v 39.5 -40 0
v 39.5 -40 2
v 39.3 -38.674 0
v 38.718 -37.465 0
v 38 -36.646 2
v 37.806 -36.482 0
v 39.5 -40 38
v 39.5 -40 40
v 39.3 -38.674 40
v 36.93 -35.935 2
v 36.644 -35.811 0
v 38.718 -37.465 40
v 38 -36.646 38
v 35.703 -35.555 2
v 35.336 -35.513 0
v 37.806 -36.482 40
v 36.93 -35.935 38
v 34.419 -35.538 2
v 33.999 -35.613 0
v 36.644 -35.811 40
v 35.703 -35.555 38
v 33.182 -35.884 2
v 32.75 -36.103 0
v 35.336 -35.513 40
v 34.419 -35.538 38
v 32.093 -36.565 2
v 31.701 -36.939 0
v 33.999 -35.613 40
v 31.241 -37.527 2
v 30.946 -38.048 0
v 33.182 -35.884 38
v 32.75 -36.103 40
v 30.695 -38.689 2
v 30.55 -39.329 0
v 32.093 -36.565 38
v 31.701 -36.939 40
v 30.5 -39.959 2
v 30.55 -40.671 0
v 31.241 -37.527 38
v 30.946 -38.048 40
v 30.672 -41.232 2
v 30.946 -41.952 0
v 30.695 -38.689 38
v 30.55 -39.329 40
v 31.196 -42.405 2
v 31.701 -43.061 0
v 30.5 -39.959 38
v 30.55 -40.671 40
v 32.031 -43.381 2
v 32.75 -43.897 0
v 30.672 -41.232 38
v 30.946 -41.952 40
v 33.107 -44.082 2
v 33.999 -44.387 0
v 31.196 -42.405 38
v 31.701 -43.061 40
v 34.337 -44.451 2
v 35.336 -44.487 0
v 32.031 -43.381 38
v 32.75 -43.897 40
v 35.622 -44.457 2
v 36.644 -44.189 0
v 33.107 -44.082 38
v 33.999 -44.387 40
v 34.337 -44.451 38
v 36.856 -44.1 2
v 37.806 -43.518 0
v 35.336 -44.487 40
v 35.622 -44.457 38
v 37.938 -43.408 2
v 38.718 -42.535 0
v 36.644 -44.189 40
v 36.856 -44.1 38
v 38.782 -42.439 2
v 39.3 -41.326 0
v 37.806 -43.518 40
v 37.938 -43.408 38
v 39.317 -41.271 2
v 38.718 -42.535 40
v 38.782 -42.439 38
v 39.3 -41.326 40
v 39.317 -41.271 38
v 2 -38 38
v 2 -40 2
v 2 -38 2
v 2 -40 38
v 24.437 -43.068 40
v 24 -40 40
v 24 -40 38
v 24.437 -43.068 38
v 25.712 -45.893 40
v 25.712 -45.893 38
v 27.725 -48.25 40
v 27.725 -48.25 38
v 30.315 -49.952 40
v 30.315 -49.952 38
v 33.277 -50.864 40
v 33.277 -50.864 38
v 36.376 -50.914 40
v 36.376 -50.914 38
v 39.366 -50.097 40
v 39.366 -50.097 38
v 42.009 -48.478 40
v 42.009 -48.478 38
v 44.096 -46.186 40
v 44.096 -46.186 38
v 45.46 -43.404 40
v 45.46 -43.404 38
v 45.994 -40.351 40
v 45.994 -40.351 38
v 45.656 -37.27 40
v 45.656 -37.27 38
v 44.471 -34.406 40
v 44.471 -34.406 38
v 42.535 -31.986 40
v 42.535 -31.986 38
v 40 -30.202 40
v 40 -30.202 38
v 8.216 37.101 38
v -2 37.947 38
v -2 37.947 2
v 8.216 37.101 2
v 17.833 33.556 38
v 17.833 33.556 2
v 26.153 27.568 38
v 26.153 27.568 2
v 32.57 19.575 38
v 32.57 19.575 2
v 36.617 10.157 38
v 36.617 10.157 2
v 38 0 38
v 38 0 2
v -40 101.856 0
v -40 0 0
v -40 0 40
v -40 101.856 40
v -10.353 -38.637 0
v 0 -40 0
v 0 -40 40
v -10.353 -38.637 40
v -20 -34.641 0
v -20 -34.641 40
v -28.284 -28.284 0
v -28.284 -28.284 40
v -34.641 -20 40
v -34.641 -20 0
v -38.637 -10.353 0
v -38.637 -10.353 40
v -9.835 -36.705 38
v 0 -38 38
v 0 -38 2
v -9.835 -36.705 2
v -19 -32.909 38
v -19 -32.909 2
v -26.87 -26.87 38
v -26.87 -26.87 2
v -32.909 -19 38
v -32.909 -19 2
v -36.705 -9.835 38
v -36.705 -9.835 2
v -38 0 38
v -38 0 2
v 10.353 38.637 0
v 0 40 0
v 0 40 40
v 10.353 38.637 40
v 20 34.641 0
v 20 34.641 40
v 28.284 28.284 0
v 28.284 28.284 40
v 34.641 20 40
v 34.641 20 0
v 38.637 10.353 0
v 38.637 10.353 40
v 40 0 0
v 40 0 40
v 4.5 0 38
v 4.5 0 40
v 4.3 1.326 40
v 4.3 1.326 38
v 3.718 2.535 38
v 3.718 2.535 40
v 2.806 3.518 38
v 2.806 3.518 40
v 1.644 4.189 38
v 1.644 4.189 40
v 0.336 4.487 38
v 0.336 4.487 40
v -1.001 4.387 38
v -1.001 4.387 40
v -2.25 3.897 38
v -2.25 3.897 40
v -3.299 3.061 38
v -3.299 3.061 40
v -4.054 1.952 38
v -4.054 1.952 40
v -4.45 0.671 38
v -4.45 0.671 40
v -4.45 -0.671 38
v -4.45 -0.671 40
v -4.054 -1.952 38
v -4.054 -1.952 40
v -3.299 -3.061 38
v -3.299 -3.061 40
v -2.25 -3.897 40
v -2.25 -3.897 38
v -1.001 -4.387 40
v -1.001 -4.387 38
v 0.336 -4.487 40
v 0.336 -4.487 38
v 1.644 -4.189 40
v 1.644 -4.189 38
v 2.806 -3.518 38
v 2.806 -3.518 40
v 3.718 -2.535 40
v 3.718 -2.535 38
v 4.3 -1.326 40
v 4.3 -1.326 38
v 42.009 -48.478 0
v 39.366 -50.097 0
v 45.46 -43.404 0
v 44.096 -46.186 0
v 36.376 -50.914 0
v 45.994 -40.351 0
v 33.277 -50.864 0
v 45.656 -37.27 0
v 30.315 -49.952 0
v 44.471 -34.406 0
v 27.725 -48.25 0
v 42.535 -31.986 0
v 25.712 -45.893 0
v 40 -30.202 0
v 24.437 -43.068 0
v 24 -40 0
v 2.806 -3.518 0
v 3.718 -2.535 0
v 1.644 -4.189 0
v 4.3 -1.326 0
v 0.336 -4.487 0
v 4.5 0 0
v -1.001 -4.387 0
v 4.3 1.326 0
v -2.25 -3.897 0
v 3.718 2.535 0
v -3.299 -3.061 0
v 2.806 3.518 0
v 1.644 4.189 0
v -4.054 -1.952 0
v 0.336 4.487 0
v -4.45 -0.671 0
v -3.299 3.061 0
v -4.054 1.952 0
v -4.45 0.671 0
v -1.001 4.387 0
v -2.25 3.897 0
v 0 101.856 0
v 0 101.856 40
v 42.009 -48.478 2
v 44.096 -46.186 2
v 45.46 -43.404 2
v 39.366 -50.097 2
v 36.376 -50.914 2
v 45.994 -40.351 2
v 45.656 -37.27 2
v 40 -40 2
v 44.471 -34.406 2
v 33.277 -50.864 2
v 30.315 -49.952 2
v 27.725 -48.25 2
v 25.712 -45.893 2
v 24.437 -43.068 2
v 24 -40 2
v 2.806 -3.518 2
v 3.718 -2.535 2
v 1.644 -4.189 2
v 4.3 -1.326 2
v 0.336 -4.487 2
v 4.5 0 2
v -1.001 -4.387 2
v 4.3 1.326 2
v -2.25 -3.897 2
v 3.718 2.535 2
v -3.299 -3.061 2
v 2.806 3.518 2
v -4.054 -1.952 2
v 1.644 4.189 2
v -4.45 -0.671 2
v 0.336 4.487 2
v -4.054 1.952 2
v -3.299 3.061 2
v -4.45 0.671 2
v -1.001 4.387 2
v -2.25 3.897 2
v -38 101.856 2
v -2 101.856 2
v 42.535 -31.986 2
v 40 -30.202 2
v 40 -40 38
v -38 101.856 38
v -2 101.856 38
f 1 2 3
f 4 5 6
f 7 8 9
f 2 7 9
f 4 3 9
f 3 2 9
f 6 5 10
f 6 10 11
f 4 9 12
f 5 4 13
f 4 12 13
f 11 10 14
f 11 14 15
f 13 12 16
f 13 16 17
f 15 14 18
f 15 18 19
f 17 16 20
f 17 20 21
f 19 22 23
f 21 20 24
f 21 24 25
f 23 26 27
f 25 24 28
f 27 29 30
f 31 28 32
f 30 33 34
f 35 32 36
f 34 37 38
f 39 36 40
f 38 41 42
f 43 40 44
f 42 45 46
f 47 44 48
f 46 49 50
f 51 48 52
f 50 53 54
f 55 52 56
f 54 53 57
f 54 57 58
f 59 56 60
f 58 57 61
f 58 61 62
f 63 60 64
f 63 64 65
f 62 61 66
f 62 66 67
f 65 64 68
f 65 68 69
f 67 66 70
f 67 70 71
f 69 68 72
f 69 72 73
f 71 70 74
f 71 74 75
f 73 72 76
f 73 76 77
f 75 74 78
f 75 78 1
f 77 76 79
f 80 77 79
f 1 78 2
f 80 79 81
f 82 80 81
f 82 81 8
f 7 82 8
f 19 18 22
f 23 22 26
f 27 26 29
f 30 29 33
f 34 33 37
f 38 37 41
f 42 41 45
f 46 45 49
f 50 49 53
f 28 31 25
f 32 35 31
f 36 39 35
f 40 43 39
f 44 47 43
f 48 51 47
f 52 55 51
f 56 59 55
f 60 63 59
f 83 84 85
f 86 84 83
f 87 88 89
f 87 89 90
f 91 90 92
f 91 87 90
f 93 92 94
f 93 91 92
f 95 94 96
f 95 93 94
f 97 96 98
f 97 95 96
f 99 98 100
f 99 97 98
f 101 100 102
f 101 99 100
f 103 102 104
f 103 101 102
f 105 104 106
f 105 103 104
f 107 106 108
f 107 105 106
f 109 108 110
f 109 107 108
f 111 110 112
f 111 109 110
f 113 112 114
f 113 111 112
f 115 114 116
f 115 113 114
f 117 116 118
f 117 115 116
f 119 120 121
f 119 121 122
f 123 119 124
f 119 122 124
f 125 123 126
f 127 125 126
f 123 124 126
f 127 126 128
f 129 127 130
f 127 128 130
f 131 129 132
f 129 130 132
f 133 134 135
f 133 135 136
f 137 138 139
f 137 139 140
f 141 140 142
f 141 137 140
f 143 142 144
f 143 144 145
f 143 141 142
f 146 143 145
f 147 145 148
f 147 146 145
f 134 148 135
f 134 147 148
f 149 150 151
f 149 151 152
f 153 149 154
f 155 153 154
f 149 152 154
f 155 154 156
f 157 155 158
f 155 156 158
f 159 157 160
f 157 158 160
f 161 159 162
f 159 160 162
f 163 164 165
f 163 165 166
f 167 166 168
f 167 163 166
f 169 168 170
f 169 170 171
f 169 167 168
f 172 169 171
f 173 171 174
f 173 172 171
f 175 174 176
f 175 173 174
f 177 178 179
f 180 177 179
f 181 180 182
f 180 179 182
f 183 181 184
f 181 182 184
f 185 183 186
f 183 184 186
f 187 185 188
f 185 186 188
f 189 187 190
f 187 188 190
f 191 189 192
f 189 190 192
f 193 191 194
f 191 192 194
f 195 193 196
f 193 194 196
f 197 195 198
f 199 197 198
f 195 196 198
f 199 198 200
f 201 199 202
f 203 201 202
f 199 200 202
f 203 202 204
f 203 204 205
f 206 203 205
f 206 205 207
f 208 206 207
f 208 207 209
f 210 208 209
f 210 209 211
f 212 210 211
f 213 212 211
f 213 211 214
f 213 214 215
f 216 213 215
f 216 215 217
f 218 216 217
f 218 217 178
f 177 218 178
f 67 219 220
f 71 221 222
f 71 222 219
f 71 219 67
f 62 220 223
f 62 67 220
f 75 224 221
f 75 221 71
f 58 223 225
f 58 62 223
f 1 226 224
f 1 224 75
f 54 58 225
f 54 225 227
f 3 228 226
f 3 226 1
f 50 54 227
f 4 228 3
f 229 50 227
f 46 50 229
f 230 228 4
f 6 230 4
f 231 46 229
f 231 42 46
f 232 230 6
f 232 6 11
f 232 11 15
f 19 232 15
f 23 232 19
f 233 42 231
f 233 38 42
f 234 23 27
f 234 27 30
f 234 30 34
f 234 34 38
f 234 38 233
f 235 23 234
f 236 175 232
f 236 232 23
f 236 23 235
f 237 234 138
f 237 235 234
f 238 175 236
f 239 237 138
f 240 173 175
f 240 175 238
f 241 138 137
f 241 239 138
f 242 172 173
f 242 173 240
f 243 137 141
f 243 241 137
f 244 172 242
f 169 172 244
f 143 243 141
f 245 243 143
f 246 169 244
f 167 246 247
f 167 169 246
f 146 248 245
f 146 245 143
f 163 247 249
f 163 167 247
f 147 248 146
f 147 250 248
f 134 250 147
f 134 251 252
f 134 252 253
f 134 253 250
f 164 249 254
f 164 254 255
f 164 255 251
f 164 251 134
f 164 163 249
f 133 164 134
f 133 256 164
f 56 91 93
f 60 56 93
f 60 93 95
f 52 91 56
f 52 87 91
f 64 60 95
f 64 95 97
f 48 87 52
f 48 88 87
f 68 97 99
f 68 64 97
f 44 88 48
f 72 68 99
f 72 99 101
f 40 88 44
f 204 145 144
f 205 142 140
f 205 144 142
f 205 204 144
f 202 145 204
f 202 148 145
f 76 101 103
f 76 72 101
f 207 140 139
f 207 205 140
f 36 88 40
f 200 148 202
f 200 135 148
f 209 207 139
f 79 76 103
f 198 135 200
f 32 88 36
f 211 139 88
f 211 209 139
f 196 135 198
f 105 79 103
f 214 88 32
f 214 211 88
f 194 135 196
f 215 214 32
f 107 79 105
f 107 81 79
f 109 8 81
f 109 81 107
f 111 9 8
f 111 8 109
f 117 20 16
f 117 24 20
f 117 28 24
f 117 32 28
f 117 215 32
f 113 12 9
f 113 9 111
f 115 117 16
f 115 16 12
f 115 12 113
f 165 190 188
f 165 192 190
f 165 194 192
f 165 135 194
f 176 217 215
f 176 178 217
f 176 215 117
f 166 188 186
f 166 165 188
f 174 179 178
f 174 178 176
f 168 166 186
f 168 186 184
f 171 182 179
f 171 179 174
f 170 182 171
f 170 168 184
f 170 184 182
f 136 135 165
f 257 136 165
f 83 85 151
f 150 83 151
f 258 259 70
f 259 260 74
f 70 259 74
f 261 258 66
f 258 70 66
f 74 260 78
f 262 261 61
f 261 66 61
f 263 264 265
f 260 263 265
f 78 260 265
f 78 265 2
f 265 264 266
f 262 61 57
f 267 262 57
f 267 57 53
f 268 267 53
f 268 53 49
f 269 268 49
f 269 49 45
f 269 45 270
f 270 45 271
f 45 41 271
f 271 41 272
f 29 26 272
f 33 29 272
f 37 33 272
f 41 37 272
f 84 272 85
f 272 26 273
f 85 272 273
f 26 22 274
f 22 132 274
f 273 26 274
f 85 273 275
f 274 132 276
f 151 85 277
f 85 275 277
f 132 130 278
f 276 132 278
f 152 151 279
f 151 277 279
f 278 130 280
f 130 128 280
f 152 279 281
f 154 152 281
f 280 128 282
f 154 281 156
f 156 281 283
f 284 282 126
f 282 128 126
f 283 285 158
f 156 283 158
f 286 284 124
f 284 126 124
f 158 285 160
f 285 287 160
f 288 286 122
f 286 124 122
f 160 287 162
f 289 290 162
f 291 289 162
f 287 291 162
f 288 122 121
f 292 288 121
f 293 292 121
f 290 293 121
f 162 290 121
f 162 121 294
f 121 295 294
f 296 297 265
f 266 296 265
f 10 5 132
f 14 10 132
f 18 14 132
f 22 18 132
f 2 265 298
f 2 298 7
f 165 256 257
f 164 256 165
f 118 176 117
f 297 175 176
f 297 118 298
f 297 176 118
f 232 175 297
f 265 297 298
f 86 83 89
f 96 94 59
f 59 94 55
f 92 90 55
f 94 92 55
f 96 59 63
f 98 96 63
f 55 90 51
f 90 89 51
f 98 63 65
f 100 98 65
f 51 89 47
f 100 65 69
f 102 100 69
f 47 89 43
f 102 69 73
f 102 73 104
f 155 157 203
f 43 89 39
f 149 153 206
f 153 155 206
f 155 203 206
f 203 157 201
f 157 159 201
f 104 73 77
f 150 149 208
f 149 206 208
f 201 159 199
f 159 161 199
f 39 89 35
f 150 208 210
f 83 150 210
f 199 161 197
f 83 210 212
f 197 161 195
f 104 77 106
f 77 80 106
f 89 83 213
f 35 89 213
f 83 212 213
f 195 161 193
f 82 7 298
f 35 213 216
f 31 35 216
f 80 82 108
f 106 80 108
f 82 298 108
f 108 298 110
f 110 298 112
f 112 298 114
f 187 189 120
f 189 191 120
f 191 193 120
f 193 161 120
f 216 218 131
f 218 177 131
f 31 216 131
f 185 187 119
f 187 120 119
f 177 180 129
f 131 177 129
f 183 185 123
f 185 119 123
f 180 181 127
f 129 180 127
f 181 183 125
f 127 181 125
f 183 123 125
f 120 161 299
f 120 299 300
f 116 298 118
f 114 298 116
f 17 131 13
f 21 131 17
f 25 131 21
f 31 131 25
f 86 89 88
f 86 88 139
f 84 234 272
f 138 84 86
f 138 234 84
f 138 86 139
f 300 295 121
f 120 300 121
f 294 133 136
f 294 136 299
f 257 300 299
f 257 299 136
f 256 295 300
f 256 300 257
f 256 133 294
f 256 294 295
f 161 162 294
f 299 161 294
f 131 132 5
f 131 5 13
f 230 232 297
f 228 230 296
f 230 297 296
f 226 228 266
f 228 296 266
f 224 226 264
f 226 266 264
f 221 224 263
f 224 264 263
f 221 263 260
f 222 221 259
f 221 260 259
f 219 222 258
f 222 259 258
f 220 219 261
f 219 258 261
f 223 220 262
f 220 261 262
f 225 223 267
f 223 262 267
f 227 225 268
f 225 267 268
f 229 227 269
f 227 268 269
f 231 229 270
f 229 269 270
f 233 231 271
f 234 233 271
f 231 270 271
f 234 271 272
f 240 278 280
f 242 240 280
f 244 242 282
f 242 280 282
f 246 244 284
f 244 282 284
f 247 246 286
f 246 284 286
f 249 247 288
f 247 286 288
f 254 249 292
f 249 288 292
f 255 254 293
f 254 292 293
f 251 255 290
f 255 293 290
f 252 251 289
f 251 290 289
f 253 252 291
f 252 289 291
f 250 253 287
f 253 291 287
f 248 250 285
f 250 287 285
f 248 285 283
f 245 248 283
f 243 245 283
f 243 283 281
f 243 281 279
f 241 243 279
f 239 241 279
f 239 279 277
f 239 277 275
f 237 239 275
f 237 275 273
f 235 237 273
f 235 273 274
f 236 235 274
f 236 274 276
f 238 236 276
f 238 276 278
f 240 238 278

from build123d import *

# Parameters (mm, degrees)
BOSS_EXTRUDE1_DEPTH = 40
SHELL1_T            = -2
SKETCH2_W           = 36
SKETCH2_H           = 36
CUT_EXTRUDE1_DEPTH  = 40
SKETCH7_R           = 11
BOSS_EXTRUDE3_DEPTH = 2
CUT_EXTRUDE4_REACH  = 120.704
SKETCH8_R           = 4.5
BOSS_EXTRUDE4_START = -2
SKETCH9_R           = 11
BOSS_EXTRUDE4_DEPTH = 2
SKETCH10_R          = 4.5
CUT_EXTRUDE5_DEPTH  = 119.70397032


with BuildPart() as part:
    # Sketch1 → Boss-Extrude1 (new body)
    with BuildSketch(Plane.XY):
        with BuildLine():
            Line((-40, 0), (-40, 101.855940277))
            Line((-40, 101.855940277), (0, 101.855940277))
            Line((0, 101.855940277), (0, 40))
            ThreePointArc((0, 40), (28.284271247, 28.284271247), (40, 0))
            Line((40, 0), (40, -40))
            Line((40, -40), (0, -40))
            ThreePointArc((0, -40), (-28.284271247, -28.284271247), (-40, 0))
        make_face()
    extrude(amount=BOSS_EXTRUDE1_DEPTH)

    # Shell1
    shell1_openings = [part.faces().sort_by_distance(p)[0] for p in [
        (-20, 101.855940277, 20),
    ]]
    offset(amount=SHELL1_T, openings=shell1_openings, kind=Kind.INTERSECTION)

    # Sketch2 → Cut-Extrude1 (cut)
    with BuildSketch(Plane.XZ.offset(40)):
        with Locations((20, 20)):
            Rectangle(SKETCH2_W, SKETCH2_H)
    extrude(amount=-CUT_EXTRUDE1_DEPTH, mode=Mode.SUBTRACT)

    # Sketch7 → Boss-Extrude3 (add)
    with BuildSketch(Plane.XY.offset(40)):
        with Locations((35, -40)):
            Circle(SKETCH7_R)
    extrude(amount=-BOSS_EXTRUDE3_DEPTH)

    # Cut-Extrude4: up to this face of the body (flat: up to its plane)
    cut_extrude4_end = Plane(part.part.faces().sort_by_distance((-6.043930541, 21.434186246, 0))[0])
    # Sketch8 → Cut-Extrude4 (cut, up to the picked face)
    with BuildSketch(Plane.XY.offset(40), mode=Mode.PRIVATE) as cut_extrude4_sk1:
        Circle(SKETCH8_R)
    cut_extrude4_tool1 = split(extrude(cut_extrude4_sk1.sketch, amount=-CUT_EXTRUDE4_REACH, mode=Mode.PRIVATE), bisect_by=cut_extrude4_end, keep=Keep.BOTH, mode=Mode.PRIVATE)
    add(cut_extrude4_tool1.solids().sort_by(Axis((0, 0, 40), (0, 0, -1)))[0], mode=Mode.SUBTRACT)

    # Sketch9 → Boss-Extrude4 (add)
    with BuildSketch(Plane(origin=(0, 0, 0), x_dir=(-1, 0, 0), z_dir=(0, 0, -1)).offset(BOSS_EXTRUDE4_START)):
        with Locations((-35, -40)):
            Circle(SKETCH9_R)
    extrude(amount=BOSS_EXTRUDE4_DEPTH)

    # Sketch10 → Cut-Extrude5 (cut, through all)
    with BuildSketch(Plane.XY.offset(40)):
        with Locations((35, -40)):
            Circle(SKETCH10_R)
    extrude(amount=-CUT_EXTRUDE5_DEPTH, mode=Mode.SUBTRACT)


solid = part.part
